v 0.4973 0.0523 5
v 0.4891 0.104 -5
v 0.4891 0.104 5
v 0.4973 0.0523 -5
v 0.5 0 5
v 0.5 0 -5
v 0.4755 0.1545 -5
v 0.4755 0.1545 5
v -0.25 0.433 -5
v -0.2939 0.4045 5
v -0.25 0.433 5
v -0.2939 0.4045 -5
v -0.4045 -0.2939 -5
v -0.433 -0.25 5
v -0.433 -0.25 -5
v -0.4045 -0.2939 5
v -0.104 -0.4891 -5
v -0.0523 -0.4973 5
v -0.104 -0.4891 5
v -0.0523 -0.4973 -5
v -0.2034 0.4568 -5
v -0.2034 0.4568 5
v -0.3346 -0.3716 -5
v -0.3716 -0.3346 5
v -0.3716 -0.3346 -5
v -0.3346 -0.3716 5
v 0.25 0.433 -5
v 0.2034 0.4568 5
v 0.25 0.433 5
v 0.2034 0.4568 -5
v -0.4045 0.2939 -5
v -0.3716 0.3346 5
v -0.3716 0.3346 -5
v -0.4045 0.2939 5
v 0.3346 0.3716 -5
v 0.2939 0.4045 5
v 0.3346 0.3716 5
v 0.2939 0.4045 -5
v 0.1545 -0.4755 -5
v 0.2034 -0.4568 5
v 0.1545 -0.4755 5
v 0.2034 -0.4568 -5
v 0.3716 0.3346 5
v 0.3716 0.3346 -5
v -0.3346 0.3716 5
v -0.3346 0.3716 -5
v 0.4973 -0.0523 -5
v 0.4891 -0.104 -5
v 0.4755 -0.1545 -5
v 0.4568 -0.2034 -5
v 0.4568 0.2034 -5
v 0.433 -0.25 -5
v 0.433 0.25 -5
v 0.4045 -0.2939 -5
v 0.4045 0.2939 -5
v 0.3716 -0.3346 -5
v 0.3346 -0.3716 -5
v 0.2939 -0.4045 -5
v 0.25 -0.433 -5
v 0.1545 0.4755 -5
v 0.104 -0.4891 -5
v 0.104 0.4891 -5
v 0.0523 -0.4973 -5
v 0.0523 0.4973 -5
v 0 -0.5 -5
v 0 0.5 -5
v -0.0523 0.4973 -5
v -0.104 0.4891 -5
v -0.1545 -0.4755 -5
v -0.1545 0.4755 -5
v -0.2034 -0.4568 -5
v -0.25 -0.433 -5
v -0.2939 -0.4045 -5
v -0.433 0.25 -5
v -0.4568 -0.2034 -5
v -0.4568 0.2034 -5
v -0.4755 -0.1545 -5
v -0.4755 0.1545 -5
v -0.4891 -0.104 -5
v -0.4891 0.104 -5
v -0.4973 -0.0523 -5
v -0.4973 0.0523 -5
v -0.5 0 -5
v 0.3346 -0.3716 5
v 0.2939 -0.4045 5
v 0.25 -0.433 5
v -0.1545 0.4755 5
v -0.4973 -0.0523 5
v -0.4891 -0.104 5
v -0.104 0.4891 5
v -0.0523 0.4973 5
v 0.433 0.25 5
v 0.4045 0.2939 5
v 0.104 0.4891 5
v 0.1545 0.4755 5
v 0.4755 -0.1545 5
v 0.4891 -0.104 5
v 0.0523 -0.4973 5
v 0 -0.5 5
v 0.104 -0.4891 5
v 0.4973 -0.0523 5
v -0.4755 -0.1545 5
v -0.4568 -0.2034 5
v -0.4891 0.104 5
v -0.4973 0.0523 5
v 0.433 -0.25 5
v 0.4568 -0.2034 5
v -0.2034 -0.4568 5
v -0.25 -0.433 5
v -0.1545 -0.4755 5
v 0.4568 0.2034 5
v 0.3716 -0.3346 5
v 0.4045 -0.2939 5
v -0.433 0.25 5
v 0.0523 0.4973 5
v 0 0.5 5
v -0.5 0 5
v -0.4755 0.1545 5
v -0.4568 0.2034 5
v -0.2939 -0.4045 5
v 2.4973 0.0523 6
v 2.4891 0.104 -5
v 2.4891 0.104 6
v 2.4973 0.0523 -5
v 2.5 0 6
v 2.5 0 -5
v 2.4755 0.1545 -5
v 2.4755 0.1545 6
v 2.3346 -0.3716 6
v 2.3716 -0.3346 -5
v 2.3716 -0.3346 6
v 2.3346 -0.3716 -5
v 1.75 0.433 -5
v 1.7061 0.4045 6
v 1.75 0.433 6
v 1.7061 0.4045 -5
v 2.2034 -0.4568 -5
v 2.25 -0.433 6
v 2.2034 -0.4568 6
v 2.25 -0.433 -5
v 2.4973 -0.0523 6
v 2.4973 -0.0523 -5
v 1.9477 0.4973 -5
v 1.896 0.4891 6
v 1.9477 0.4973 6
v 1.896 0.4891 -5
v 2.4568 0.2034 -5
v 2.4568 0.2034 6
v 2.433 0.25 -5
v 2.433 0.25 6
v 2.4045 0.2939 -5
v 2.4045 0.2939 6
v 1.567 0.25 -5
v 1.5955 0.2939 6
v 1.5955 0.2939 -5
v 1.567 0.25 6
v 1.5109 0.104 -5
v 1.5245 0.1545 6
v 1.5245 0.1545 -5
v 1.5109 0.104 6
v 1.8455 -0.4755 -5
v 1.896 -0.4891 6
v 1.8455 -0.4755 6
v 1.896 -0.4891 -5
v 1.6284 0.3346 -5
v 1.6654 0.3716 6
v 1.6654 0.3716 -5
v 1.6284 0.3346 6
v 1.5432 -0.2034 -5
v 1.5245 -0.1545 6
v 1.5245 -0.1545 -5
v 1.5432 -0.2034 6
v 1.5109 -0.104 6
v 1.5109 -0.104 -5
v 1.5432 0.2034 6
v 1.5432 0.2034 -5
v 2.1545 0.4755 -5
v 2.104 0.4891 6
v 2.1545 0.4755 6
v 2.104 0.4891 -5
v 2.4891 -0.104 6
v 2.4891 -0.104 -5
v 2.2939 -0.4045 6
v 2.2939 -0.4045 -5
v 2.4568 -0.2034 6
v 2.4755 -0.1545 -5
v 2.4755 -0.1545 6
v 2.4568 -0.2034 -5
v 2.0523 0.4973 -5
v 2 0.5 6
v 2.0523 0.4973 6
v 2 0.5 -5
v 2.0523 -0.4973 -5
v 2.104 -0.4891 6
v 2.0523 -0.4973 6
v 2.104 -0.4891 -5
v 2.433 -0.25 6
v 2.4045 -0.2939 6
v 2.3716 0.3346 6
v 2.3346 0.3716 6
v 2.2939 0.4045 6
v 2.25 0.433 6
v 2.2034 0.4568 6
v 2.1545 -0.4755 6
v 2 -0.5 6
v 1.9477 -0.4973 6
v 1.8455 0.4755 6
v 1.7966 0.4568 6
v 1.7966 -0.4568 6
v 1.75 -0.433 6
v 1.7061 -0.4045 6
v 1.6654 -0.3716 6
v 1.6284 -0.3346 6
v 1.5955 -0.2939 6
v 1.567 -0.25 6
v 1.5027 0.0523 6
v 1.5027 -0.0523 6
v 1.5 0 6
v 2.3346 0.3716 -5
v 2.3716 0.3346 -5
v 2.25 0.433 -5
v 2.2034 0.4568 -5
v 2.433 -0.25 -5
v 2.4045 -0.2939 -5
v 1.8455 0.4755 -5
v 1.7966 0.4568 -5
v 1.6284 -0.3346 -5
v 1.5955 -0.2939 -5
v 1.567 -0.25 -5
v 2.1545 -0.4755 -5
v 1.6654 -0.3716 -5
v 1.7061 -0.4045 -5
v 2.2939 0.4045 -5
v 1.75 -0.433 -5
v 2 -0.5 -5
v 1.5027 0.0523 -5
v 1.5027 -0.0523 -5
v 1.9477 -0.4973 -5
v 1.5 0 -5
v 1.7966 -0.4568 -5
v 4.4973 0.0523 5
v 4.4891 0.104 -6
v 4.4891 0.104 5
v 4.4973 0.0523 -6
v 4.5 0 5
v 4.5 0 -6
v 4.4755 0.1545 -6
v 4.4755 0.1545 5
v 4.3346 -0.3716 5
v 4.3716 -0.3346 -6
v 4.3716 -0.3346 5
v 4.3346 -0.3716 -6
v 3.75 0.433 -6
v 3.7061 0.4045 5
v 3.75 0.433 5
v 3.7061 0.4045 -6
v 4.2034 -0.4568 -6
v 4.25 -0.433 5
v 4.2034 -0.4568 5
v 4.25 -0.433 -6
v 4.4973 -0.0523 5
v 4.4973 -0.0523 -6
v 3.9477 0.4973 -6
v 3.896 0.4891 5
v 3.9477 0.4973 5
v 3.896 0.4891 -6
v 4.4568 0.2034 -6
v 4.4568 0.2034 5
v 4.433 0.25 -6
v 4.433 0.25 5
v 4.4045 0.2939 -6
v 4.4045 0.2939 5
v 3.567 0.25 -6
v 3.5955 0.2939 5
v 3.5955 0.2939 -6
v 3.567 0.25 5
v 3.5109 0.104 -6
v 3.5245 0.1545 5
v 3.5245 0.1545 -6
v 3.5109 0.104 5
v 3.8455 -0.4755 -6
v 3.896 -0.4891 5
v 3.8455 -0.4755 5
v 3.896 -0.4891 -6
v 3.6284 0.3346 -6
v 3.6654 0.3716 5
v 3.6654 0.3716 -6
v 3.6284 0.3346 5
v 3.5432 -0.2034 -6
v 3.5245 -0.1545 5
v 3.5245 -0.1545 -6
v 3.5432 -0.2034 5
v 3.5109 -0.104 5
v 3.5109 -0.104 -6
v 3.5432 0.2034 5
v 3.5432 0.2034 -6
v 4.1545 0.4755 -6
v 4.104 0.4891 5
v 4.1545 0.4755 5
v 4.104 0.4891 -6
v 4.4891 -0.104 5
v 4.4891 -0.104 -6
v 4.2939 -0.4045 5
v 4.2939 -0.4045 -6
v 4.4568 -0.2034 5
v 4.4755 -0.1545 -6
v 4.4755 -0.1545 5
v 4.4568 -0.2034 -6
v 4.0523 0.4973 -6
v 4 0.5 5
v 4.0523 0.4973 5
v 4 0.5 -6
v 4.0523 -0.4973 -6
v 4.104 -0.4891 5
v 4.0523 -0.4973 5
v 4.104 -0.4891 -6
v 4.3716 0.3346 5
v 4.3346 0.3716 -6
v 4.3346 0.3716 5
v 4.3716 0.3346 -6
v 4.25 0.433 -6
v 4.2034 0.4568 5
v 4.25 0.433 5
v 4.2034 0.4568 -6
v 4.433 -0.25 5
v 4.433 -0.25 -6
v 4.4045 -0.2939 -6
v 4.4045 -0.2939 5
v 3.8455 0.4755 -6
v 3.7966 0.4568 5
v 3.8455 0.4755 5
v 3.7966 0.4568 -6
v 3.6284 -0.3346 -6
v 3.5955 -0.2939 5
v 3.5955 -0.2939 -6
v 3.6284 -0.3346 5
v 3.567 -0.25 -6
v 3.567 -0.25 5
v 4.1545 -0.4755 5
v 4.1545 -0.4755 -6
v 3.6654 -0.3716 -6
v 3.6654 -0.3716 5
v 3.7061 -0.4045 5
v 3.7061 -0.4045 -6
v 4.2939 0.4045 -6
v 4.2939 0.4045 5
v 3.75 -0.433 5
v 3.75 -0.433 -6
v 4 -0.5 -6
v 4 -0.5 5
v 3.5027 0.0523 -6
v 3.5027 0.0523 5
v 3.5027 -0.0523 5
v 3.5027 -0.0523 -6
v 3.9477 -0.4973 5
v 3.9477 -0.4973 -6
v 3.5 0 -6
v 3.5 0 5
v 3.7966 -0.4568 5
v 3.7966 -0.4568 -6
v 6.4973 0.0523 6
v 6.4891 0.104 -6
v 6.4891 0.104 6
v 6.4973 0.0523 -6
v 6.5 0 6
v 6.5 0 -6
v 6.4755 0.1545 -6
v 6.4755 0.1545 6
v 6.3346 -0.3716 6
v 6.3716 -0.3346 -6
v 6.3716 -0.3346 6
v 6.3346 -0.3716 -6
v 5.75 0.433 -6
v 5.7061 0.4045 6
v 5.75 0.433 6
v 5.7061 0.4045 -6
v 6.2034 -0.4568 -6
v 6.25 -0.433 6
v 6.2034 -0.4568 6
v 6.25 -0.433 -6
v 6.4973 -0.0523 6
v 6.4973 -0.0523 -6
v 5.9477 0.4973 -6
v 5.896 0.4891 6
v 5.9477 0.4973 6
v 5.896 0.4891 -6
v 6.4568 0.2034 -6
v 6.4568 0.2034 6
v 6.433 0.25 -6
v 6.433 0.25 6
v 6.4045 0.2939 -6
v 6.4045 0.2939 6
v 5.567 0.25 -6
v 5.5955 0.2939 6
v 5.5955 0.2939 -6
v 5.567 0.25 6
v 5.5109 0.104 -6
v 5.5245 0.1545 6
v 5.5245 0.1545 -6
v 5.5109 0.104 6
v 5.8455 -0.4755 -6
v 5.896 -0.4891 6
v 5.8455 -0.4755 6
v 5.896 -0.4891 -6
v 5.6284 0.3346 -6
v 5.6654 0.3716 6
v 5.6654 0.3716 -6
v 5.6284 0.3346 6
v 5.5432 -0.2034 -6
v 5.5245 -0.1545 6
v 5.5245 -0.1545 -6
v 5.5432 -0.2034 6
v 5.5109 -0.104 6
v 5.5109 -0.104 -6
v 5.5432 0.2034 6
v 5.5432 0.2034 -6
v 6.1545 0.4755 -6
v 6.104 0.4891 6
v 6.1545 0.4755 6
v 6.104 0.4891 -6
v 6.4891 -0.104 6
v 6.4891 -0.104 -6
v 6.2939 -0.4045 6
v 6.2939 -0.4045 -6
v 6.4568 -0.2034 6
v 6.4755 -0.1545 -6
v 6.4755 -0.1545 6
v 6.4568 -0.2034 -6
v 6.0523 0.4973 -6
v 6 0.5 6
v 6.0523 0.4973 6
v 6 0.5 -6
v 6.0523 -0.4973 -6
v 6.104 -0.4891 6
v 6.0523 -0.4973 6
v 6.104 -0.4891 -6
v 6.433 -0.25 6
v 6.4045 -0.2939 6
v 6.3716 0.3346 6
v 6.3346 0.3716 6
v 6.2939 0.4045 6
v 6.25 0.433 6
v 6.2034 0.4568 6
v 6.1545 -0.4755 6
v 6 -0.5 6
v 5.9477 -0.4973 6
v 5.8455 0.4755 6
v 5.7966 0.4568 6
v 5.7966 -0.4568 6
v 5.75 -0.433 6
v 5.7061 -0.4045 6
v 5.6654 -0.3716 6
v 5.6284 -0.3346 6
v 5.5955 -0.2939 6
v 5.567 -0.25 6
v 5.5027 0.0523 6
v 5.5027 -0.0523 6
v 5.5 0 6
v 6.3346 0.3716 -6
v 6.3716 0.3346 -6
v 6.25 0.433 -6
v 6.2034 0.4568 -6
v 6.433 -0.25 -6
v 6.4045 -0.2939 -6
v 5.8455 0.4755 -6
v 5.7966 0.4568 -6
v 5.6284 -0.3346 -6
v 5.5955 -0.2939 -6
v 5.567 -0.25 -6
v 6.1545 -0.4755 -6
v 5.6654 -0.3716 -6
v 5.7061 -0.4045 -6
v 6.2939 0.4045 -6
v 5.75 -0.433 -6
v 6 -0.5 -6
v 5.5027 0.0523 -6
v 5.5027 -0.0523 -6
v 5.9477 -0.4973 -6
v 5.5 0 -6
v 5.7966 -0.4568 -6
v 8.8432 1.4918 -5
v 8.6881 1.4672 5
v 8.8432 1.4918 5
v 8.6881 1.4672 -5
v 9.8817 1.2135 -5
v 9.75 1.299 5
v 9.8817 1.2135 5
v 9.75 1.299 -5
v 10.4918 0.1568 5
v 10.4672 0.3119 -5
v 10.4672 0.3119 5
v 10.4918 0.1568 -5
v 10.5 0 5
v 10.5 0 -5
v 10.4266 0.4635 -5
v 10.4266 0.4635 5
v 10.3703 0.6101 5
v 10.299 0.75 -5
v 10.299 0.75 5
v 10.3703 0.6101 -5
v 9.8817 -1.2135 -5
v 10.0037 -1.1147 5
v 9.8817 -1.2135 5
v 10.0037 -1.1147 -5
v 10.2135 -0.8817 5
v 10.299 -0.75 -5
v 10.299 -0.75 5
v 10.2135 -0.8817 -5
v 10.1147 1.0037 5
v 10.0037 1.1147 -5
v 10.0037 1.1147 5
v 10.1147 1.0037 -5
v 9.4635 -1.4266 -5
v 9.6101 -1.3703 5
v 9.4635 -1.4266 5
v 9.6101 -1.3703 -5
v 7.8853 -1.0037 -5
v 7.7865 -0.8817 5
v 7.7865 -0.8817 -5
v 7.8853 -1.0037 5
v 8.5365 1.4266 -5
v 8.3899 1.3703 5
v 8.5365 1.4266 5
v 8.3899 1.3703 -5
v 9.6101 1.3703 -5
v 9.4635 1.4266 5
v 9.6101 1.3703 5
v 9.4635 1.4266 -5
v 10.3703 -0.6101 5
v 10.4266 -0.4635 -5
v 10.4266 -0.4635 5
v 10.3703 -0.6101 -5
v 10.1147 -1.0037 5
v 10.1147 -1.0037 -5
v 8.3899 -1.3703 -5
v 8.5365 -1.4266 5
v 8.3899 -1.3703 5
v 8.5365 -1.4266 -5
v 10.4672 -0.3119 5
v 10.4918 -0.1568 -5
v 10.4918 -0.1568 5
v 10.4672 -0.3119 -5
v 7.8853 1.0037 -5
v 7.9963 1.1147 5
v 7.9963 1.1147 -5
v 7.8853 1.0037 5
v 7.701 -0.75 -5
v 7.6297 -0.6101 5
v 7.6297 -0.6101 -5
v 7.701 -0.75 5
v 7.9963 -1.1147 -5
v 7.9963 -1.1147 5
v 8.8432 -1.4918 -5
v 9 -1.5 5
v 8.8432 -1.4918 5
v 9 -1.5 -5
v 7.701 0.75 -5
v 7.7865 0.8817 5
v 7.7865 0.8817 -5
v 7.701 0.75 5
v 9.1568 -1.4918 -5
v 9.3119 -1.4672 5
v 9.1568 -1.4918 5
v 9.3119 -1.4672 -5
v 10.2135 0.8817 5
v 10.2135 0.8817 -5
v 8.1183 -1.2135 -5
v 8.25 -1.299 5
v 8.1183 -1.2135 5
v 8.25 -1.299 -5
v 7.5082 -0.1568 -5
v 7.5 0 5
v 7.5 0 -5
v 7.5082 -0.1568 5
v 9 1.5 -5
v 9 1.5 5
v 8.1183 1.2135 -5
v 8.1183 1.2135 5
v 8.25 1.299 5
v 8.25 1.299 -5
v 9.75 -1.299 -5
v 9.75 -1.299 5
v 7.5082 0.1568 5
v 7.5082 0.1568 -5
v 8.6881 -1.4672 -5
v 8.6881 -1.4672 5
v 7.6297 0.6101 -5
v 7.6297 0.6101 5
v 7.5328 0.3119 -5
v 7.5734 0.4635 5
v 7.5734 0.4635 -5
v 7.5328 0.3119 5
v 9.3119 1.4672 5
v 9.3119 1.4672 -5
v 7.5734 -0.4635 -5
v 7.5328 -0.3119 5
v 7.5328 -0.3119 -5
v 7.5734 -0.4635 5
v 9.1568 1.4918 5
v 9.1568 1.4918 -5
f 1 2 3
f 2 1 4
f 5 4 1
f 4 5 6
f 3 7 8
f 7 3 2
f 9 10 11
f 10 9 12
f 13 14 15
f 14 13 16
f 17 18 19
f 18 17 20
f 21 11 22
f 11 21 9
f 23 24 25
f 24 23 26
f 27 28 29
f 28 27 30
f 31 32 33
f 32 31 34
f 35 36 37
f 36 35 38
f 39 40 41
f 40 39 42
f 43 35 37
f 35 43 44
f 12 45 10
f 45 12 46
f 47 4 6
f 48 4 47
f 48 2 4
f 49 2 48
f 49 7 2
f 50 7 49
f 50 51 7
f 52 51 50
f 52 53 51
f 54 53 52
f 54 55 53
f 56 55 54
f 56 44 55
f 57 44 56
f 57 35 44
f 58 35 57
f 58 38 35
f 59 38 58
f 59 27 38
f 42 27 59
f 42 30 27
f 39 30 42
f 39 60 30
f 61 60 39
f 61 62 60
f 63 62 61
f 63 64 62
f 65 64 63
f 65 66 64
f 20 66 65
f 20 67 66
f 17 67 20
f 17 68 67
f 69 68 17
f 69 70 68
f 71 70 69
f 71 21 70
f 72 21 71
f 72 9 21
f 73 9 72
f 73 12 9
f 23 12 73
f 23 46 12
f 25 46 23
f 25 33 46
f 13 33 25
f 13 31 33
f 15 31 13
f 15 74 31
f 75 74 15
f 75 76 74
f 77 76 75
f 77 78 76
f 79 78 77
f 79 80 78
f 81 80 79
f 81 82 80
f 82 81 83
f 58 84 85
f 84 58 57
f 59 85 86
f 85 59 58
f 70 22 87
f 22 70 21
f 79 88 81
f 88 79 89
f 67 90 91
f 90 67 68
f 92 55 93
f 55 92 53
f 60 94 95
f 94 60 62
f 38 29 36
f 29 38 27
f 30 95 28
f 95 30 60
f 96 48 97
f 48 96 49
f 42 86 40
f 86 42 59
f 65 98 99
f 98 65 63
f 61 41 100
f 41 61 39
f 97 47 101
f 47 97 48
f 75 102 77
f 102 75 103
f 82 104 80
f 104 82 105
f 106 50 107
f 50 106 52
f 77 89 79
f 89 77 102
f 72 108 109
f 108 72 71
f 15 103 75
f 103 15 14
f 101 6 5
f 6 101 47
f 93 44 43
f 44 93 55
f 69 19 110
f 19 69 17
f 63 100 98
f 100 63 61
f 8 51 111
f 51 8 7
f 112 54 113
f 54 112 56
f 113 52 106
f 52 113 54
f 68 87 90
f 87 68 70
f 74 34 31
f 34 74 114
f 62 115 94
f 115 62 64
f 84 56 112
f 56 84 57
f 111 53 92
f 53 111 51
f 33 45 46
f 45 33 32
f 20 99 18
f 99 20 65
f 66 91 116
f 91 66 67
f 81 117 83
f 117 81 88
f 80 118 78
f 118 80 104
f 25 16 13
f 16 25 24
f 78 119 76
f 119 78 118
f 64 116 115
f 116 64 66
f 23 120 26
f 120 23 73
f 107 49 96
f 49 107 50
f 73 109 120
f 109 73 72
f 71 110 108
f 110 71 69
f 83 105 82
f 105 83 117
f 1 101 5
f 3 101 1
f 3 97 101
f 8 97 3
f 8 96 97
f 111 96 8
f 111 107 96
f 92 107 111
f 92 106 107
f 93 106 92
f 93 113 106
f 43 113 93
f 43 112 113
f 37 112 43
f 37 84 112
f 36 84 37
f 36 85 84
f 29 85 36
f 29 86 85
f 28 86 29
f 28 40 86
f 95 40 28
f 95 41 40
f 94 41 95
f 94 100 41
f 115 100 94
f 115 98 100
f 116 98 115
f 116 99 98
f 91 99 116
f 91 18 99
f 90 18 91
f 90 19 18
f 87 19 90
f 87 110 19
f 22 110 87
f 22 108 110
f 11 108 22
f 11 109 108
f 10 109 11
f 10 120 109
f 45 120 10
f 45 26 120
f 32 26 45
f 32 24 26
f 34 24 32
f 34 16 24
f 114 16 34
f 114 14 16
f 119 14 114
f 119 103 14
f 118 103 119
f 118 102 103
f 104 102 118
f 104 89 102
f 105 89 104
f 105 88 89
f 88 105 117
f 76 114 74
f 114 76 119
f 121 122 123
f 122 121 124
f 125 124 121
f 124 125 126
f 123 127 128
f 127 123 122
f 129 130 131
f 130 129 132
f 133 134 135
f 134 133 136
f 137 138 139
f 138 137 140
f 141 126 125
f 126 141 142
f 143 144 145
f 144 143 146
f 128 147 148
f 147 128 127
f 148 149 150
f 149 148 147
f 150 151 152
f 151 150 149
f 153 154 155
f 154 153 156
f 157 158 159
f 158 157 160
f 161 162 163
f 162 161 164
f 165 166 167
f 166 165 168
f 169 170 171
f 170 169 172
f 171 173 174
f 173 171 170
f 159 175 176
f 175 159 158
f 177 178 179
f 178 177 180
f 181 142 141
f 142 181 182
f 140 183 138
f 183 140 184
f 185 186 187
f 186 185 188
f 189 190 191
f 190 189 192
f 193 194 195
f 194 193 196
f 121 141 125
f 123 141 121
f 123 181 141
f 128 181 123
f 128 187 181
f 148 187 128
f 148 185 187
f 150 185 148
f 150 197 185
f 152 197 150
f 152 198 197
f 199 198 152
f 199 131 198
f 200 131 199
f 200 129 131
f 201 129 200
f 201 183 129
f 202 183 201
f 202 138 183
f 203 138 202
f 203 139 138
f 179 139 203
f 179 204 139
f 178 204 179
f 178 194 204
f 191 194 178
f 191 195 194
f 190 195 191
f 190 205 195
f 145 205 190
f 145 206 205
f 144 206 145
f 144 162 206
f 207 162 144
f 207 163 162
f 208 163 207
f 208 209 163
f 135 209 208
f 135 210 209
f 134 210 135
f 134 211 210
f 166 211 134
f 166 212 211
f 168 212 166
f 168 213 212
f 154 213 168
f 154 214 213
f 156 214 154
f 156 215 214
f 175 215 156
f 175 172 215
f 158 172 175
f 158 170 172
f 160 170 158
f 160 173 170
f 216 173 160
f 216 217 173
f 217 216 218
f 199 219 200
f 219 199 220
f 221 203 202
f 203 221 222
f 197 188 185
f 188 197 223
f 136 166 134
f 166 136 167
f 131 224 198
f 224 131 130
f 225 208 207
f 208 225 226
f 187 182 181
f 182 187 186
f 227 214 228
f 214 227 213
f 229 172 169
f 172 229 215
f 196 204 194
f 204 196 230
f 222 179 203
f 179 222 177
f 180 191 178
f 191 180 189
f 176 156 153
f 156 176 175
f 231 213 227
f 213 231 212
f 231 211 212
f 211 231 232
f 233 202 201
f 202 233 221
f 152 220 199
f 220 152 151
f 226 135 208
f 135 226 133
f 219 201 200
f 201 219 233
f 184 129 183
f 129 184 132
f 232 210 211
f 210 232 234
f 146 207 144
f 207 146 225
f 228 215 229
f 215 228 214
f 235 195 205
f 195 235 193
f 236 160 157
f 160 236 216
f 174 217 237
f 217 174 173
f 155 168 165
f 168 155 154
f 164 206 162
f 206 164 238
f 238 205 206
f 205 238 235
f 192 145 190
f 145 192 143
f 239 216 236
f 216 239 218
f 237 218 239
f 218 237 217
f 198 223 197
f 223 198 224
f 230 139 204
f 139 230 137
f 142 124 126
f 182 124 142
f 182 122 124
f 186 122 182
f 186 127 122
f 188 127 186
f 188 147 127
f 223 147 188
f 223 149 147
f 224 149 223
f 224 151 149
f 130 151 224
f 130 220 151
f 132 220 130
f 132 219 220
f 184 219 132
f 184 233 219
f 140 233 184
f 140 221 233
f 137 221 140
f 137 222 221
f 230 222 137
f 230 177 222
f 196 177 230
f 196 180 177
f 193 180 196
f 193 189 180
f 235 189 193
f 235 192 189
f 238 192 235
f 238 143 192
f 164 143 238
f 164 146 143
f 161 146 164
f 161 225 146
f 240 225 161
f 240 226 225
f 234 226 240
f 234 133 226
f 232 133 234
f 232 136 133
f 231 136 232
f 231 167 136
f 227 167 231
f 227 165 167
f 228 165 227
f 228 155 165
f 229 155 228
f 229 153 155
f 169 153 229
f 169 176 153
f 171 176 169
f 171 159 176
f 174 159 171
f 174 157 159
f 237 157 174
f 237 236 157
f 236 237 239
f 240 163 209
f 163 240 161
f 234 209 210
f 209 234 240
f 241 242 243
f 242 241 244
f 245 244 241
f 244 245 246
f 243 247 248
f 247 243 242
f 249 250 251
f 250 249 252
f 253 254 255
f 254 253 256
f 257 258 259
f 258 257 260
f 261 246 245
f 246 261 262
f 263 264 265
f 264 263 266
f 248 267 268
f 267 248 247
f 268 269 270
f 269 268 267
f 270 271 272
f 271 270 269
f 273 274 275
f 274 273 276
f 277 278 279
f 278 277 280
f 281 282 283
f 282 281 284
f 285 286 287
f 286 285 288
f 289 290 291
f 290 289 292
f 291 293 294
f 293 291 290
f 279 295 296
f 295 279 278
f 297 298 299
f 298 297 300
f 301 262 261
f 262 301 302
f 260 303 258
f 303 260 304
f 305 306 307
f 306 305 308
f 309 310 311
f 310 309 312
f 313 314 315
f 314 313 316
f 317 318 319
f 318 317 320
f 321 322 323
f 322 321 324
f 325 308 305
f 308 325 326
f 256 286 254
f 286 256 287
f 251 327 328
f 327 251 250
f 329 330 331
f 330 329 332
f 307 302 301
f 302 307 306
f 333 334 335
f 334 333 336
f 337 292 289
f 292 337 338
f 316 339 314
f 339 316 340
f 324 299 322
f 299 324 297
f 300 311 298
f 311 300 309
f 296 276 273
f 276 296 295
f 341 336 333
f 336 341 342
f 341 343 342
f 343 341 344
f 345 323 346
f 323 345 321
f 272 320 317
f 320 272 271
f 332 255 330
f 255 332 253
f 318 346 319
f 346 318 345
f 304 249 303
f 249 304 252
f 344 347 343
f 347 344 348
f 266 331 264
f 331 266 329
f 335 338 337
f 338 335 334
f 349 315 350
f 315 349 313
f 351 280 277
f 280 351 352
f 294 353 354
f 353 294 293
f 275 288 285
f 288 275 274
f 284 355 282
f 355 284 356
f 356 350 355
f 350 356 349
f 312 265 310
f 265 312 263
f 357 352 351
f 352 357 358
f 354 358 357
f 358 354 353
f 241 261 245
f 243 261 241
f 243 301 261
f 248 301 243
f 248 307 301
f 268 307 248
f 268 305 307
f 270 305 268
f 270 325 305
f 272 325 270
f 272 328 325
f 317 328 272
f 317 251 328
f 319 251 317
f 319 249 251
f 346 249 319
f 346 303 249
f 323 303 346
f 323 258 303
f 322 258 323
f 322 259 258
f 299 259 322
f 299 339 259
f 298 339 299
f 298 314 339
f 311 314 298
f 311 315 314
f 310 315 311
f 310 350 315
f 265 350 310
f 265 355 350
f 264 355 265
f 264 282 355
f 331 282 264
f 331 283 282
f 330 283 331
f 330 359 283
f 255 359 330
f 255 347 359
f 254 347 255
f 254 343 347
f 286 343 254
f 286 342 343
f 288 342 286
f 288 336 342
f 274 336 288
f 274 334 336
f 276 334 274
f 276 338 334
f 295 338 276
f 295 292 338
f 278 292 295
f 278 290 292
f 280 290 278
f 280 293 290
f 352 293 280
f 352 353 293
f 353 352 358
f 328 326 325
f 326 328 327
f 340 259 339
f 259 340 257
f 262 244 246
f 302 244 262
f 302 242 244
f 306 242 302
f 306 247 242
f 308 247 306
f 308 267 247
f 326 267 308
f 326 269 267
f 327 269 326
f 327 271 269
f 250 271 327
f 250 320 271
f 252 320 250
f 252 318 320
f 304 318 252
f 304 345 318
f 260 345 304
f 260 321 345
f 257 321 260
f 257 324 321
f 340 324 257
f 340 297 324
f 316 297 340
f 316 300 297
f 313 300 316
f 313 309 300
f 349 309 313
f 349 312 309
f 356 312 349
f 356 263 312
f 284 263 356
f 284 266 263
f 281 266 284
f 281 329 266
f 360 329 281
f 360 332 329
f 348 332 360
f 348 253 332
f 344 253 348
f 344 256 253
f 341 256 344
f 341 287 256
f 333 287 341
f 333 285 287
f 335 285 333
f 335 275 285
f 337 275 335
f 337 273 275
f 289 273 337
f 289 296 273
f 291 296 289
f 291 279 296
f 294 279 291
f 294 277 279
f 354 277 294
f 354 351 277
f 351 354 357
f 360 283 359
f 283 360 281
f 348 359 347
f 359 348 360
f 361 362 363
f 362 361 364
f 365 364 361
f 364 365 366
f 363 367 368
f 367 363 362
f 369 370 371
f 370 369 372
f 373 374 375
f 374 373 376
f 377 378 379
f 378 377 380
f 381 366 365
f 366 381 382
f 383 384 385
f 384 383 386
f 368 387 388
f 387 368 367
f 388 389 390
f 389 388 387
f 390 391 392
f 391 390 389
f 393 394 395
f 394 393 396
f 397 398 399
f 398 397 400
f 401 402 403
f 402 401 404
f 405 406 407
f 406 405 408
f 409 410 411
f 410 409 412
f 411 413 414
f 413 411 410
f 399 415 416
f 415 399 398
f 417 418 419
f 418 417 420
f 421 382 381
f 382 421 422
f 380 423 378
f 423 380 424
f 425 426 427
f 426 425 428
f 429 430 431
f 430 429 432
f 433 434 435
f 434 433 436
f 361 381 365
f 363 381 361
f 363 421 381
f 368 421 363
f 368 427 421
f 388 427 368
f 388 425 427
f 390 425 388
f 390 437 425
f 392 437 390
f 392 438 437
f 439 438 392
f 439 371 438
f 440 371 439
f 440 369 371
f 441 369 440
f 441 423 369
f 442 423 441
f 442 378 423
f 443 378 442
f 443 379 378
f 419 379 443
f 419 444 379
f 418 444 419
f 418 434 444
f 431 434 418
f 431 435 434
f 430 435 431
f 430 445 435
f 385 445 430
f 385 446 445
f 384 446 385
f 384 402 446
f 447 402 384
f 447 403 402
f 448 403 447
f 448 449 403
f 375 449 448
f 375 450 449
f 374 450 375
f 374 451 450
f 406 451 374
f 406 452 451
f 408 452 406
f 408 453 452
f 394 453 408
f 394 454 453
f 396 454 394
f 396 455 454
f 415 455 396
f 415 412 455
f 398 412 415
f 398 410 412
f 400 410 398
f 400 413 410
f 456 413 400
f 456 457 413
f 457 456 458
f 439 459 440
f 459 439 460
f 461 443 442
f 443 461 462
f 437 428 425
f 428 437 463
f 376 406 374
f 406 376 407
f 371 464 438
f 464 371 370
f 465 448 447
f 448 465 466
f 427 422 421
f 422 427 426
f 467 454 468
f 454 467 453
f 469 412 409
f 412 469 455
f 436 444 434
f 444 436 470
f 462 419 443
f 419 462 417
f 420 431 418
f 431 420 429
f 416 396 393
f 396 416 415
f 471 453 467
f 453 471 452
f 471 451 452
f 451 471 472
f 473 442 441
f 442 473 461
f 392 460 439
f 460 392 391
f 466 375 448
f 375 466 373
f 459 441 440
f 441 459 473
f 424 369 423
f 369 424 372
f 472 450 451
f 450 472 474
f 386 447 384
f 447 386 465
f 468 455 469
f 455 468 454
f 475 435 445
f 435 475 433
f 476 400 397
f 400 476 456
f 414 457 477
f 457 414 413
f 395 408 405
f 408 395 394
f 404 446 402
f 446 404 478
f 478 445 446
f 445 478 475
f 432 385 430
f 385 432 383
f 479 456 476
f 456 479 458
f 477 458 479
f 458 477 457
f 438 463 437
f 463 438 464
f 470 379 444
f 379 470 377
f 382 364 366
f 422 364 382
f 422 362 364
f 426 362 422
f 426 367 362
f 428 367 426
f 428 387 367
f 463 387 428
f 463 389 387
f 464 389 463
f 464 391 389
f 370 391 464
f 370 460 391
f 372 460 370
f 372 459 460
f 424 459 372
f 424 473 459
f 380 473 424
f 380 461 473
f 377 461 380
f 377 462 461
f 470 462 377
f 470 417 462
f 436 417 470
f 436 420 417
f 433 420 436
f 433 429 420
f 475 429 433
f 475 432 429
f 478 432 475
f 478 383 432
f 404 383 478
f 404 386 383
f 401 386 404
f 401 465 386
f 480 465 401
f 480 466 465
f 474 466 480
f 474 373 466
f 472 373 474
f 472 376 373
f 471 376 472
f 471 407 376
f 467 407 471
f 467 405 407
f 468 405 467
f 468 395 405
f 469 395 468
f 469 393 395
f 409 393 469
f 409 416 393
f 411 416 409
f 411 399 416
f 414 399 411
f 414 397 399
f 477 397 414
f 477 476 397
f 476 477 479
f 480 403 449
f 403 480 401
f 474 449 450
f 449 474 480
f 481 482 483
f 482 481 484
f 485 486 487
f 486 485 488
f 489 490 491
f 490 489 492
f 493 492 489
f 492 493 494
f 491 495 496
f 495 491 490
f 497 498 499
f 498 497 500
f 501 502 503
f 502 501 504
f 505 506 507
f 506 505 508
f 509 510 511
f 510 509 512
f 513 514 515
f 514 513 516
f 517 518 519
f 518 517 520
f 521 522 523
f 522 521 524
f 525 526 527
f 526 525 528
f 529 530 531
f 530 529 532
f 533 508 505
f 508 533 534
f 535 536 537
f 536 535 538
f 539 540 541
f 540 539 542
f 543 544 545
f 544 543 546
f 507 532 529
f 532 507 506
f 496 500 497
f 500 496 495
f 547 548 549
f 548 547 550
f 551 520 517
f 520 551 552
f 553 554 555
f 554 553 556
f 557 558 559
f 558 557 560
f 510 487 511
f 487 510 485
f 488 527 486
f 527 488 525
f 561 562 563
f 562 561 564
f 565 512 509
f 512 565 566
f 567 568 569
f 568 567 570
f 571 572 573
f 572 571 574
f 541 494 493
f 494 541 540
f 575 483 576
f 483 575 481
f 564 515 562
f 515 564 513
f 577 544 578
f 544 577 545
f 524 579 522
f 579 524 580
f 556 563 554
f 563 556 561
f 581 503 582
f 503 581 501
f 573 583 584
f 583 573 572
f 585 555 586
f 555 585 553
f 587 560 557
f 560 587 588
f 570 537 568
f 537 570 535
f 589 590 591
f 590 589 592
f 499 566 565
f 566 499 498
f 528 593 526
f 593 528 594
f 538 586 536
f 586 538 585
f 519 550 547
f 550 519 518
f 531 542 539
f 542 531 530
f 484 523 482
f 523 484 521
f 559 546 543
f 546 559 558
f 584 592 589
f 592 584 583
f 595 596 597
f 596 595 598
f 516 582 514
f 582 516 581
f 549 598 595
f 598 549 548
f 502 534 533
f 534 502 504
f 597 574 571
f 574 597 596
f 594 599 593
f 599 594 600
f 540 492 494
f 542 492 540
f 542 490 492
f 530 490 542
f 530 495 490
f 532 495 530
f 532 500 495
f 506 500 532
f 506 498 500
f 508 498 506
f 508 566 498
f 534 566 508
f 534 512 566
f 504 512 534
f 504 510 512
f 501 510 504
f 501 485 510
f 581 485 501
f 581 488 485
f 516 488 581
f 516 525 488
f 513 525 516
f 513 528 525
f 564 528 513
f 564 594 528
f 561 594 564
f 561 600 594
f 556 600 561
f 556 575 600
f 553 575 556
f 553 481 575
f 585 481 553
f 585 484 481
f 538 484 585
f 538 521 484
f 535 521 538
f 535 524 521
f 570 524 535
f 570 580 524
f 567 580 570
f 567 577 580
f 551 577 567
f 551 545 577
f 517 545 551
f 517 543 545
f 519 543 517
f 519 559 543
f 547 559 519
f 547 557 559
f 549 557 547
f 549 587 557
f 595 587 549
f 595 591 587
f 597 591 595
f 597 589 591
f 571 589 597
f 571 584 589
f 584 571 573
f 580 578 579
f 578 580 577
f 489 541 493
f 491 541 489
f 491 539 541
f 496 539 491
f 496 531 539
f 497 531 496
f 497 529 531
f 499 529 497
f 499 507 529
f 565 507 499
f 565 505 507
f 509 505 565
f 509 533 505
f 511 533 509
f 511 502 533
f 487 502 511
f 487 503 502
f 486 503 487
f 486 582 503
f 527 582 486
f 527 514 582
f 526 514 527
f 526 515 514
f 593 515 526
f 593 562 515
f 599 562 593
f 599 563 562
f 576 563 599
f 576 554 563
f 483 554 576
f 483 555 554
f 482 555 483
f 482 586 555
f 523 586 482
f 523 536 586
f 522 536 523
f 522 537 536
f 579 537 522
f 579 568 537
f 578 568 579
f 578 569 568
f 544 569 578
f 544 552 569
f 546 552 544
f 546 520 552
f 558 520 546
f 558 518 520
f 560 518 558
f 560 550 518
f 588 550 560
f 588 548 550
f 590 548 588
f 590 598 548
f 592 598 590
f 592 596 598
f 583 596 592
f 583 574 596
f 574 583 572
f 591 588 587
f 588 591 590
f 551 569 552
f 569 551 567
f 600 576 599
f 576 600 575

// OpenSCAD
// Unit of length: Unit.MM
$fn = 60;

union()
{
   cylinder(h = 10.0, d = 1.0, center = true);
   translate(v = [2.0, 0.0, 0.0])
   {
      translate(v = [0.0, 0.0, -5.0])
      {
         cylinder(h = 11.0, d = 1.0, center = false);
      }
   }
   translate(v = [4.0, 0.0, 0.0])
   {
      translate(v = [0.0, 0.0, -6.0])
      {
         cylinder(h = 11.0, d = 1.0, center = false);
      }
   }
   translate(v = [6.0, 0.0, 0.0])
   {
      cylinder(h = 12.0, d = 1.0, center = true);
   }
   translate(v = [9.0, 0.0, 0.0])
   {
      cylinder(h = 10.0, d = 3.0, center = true);
   }
}
